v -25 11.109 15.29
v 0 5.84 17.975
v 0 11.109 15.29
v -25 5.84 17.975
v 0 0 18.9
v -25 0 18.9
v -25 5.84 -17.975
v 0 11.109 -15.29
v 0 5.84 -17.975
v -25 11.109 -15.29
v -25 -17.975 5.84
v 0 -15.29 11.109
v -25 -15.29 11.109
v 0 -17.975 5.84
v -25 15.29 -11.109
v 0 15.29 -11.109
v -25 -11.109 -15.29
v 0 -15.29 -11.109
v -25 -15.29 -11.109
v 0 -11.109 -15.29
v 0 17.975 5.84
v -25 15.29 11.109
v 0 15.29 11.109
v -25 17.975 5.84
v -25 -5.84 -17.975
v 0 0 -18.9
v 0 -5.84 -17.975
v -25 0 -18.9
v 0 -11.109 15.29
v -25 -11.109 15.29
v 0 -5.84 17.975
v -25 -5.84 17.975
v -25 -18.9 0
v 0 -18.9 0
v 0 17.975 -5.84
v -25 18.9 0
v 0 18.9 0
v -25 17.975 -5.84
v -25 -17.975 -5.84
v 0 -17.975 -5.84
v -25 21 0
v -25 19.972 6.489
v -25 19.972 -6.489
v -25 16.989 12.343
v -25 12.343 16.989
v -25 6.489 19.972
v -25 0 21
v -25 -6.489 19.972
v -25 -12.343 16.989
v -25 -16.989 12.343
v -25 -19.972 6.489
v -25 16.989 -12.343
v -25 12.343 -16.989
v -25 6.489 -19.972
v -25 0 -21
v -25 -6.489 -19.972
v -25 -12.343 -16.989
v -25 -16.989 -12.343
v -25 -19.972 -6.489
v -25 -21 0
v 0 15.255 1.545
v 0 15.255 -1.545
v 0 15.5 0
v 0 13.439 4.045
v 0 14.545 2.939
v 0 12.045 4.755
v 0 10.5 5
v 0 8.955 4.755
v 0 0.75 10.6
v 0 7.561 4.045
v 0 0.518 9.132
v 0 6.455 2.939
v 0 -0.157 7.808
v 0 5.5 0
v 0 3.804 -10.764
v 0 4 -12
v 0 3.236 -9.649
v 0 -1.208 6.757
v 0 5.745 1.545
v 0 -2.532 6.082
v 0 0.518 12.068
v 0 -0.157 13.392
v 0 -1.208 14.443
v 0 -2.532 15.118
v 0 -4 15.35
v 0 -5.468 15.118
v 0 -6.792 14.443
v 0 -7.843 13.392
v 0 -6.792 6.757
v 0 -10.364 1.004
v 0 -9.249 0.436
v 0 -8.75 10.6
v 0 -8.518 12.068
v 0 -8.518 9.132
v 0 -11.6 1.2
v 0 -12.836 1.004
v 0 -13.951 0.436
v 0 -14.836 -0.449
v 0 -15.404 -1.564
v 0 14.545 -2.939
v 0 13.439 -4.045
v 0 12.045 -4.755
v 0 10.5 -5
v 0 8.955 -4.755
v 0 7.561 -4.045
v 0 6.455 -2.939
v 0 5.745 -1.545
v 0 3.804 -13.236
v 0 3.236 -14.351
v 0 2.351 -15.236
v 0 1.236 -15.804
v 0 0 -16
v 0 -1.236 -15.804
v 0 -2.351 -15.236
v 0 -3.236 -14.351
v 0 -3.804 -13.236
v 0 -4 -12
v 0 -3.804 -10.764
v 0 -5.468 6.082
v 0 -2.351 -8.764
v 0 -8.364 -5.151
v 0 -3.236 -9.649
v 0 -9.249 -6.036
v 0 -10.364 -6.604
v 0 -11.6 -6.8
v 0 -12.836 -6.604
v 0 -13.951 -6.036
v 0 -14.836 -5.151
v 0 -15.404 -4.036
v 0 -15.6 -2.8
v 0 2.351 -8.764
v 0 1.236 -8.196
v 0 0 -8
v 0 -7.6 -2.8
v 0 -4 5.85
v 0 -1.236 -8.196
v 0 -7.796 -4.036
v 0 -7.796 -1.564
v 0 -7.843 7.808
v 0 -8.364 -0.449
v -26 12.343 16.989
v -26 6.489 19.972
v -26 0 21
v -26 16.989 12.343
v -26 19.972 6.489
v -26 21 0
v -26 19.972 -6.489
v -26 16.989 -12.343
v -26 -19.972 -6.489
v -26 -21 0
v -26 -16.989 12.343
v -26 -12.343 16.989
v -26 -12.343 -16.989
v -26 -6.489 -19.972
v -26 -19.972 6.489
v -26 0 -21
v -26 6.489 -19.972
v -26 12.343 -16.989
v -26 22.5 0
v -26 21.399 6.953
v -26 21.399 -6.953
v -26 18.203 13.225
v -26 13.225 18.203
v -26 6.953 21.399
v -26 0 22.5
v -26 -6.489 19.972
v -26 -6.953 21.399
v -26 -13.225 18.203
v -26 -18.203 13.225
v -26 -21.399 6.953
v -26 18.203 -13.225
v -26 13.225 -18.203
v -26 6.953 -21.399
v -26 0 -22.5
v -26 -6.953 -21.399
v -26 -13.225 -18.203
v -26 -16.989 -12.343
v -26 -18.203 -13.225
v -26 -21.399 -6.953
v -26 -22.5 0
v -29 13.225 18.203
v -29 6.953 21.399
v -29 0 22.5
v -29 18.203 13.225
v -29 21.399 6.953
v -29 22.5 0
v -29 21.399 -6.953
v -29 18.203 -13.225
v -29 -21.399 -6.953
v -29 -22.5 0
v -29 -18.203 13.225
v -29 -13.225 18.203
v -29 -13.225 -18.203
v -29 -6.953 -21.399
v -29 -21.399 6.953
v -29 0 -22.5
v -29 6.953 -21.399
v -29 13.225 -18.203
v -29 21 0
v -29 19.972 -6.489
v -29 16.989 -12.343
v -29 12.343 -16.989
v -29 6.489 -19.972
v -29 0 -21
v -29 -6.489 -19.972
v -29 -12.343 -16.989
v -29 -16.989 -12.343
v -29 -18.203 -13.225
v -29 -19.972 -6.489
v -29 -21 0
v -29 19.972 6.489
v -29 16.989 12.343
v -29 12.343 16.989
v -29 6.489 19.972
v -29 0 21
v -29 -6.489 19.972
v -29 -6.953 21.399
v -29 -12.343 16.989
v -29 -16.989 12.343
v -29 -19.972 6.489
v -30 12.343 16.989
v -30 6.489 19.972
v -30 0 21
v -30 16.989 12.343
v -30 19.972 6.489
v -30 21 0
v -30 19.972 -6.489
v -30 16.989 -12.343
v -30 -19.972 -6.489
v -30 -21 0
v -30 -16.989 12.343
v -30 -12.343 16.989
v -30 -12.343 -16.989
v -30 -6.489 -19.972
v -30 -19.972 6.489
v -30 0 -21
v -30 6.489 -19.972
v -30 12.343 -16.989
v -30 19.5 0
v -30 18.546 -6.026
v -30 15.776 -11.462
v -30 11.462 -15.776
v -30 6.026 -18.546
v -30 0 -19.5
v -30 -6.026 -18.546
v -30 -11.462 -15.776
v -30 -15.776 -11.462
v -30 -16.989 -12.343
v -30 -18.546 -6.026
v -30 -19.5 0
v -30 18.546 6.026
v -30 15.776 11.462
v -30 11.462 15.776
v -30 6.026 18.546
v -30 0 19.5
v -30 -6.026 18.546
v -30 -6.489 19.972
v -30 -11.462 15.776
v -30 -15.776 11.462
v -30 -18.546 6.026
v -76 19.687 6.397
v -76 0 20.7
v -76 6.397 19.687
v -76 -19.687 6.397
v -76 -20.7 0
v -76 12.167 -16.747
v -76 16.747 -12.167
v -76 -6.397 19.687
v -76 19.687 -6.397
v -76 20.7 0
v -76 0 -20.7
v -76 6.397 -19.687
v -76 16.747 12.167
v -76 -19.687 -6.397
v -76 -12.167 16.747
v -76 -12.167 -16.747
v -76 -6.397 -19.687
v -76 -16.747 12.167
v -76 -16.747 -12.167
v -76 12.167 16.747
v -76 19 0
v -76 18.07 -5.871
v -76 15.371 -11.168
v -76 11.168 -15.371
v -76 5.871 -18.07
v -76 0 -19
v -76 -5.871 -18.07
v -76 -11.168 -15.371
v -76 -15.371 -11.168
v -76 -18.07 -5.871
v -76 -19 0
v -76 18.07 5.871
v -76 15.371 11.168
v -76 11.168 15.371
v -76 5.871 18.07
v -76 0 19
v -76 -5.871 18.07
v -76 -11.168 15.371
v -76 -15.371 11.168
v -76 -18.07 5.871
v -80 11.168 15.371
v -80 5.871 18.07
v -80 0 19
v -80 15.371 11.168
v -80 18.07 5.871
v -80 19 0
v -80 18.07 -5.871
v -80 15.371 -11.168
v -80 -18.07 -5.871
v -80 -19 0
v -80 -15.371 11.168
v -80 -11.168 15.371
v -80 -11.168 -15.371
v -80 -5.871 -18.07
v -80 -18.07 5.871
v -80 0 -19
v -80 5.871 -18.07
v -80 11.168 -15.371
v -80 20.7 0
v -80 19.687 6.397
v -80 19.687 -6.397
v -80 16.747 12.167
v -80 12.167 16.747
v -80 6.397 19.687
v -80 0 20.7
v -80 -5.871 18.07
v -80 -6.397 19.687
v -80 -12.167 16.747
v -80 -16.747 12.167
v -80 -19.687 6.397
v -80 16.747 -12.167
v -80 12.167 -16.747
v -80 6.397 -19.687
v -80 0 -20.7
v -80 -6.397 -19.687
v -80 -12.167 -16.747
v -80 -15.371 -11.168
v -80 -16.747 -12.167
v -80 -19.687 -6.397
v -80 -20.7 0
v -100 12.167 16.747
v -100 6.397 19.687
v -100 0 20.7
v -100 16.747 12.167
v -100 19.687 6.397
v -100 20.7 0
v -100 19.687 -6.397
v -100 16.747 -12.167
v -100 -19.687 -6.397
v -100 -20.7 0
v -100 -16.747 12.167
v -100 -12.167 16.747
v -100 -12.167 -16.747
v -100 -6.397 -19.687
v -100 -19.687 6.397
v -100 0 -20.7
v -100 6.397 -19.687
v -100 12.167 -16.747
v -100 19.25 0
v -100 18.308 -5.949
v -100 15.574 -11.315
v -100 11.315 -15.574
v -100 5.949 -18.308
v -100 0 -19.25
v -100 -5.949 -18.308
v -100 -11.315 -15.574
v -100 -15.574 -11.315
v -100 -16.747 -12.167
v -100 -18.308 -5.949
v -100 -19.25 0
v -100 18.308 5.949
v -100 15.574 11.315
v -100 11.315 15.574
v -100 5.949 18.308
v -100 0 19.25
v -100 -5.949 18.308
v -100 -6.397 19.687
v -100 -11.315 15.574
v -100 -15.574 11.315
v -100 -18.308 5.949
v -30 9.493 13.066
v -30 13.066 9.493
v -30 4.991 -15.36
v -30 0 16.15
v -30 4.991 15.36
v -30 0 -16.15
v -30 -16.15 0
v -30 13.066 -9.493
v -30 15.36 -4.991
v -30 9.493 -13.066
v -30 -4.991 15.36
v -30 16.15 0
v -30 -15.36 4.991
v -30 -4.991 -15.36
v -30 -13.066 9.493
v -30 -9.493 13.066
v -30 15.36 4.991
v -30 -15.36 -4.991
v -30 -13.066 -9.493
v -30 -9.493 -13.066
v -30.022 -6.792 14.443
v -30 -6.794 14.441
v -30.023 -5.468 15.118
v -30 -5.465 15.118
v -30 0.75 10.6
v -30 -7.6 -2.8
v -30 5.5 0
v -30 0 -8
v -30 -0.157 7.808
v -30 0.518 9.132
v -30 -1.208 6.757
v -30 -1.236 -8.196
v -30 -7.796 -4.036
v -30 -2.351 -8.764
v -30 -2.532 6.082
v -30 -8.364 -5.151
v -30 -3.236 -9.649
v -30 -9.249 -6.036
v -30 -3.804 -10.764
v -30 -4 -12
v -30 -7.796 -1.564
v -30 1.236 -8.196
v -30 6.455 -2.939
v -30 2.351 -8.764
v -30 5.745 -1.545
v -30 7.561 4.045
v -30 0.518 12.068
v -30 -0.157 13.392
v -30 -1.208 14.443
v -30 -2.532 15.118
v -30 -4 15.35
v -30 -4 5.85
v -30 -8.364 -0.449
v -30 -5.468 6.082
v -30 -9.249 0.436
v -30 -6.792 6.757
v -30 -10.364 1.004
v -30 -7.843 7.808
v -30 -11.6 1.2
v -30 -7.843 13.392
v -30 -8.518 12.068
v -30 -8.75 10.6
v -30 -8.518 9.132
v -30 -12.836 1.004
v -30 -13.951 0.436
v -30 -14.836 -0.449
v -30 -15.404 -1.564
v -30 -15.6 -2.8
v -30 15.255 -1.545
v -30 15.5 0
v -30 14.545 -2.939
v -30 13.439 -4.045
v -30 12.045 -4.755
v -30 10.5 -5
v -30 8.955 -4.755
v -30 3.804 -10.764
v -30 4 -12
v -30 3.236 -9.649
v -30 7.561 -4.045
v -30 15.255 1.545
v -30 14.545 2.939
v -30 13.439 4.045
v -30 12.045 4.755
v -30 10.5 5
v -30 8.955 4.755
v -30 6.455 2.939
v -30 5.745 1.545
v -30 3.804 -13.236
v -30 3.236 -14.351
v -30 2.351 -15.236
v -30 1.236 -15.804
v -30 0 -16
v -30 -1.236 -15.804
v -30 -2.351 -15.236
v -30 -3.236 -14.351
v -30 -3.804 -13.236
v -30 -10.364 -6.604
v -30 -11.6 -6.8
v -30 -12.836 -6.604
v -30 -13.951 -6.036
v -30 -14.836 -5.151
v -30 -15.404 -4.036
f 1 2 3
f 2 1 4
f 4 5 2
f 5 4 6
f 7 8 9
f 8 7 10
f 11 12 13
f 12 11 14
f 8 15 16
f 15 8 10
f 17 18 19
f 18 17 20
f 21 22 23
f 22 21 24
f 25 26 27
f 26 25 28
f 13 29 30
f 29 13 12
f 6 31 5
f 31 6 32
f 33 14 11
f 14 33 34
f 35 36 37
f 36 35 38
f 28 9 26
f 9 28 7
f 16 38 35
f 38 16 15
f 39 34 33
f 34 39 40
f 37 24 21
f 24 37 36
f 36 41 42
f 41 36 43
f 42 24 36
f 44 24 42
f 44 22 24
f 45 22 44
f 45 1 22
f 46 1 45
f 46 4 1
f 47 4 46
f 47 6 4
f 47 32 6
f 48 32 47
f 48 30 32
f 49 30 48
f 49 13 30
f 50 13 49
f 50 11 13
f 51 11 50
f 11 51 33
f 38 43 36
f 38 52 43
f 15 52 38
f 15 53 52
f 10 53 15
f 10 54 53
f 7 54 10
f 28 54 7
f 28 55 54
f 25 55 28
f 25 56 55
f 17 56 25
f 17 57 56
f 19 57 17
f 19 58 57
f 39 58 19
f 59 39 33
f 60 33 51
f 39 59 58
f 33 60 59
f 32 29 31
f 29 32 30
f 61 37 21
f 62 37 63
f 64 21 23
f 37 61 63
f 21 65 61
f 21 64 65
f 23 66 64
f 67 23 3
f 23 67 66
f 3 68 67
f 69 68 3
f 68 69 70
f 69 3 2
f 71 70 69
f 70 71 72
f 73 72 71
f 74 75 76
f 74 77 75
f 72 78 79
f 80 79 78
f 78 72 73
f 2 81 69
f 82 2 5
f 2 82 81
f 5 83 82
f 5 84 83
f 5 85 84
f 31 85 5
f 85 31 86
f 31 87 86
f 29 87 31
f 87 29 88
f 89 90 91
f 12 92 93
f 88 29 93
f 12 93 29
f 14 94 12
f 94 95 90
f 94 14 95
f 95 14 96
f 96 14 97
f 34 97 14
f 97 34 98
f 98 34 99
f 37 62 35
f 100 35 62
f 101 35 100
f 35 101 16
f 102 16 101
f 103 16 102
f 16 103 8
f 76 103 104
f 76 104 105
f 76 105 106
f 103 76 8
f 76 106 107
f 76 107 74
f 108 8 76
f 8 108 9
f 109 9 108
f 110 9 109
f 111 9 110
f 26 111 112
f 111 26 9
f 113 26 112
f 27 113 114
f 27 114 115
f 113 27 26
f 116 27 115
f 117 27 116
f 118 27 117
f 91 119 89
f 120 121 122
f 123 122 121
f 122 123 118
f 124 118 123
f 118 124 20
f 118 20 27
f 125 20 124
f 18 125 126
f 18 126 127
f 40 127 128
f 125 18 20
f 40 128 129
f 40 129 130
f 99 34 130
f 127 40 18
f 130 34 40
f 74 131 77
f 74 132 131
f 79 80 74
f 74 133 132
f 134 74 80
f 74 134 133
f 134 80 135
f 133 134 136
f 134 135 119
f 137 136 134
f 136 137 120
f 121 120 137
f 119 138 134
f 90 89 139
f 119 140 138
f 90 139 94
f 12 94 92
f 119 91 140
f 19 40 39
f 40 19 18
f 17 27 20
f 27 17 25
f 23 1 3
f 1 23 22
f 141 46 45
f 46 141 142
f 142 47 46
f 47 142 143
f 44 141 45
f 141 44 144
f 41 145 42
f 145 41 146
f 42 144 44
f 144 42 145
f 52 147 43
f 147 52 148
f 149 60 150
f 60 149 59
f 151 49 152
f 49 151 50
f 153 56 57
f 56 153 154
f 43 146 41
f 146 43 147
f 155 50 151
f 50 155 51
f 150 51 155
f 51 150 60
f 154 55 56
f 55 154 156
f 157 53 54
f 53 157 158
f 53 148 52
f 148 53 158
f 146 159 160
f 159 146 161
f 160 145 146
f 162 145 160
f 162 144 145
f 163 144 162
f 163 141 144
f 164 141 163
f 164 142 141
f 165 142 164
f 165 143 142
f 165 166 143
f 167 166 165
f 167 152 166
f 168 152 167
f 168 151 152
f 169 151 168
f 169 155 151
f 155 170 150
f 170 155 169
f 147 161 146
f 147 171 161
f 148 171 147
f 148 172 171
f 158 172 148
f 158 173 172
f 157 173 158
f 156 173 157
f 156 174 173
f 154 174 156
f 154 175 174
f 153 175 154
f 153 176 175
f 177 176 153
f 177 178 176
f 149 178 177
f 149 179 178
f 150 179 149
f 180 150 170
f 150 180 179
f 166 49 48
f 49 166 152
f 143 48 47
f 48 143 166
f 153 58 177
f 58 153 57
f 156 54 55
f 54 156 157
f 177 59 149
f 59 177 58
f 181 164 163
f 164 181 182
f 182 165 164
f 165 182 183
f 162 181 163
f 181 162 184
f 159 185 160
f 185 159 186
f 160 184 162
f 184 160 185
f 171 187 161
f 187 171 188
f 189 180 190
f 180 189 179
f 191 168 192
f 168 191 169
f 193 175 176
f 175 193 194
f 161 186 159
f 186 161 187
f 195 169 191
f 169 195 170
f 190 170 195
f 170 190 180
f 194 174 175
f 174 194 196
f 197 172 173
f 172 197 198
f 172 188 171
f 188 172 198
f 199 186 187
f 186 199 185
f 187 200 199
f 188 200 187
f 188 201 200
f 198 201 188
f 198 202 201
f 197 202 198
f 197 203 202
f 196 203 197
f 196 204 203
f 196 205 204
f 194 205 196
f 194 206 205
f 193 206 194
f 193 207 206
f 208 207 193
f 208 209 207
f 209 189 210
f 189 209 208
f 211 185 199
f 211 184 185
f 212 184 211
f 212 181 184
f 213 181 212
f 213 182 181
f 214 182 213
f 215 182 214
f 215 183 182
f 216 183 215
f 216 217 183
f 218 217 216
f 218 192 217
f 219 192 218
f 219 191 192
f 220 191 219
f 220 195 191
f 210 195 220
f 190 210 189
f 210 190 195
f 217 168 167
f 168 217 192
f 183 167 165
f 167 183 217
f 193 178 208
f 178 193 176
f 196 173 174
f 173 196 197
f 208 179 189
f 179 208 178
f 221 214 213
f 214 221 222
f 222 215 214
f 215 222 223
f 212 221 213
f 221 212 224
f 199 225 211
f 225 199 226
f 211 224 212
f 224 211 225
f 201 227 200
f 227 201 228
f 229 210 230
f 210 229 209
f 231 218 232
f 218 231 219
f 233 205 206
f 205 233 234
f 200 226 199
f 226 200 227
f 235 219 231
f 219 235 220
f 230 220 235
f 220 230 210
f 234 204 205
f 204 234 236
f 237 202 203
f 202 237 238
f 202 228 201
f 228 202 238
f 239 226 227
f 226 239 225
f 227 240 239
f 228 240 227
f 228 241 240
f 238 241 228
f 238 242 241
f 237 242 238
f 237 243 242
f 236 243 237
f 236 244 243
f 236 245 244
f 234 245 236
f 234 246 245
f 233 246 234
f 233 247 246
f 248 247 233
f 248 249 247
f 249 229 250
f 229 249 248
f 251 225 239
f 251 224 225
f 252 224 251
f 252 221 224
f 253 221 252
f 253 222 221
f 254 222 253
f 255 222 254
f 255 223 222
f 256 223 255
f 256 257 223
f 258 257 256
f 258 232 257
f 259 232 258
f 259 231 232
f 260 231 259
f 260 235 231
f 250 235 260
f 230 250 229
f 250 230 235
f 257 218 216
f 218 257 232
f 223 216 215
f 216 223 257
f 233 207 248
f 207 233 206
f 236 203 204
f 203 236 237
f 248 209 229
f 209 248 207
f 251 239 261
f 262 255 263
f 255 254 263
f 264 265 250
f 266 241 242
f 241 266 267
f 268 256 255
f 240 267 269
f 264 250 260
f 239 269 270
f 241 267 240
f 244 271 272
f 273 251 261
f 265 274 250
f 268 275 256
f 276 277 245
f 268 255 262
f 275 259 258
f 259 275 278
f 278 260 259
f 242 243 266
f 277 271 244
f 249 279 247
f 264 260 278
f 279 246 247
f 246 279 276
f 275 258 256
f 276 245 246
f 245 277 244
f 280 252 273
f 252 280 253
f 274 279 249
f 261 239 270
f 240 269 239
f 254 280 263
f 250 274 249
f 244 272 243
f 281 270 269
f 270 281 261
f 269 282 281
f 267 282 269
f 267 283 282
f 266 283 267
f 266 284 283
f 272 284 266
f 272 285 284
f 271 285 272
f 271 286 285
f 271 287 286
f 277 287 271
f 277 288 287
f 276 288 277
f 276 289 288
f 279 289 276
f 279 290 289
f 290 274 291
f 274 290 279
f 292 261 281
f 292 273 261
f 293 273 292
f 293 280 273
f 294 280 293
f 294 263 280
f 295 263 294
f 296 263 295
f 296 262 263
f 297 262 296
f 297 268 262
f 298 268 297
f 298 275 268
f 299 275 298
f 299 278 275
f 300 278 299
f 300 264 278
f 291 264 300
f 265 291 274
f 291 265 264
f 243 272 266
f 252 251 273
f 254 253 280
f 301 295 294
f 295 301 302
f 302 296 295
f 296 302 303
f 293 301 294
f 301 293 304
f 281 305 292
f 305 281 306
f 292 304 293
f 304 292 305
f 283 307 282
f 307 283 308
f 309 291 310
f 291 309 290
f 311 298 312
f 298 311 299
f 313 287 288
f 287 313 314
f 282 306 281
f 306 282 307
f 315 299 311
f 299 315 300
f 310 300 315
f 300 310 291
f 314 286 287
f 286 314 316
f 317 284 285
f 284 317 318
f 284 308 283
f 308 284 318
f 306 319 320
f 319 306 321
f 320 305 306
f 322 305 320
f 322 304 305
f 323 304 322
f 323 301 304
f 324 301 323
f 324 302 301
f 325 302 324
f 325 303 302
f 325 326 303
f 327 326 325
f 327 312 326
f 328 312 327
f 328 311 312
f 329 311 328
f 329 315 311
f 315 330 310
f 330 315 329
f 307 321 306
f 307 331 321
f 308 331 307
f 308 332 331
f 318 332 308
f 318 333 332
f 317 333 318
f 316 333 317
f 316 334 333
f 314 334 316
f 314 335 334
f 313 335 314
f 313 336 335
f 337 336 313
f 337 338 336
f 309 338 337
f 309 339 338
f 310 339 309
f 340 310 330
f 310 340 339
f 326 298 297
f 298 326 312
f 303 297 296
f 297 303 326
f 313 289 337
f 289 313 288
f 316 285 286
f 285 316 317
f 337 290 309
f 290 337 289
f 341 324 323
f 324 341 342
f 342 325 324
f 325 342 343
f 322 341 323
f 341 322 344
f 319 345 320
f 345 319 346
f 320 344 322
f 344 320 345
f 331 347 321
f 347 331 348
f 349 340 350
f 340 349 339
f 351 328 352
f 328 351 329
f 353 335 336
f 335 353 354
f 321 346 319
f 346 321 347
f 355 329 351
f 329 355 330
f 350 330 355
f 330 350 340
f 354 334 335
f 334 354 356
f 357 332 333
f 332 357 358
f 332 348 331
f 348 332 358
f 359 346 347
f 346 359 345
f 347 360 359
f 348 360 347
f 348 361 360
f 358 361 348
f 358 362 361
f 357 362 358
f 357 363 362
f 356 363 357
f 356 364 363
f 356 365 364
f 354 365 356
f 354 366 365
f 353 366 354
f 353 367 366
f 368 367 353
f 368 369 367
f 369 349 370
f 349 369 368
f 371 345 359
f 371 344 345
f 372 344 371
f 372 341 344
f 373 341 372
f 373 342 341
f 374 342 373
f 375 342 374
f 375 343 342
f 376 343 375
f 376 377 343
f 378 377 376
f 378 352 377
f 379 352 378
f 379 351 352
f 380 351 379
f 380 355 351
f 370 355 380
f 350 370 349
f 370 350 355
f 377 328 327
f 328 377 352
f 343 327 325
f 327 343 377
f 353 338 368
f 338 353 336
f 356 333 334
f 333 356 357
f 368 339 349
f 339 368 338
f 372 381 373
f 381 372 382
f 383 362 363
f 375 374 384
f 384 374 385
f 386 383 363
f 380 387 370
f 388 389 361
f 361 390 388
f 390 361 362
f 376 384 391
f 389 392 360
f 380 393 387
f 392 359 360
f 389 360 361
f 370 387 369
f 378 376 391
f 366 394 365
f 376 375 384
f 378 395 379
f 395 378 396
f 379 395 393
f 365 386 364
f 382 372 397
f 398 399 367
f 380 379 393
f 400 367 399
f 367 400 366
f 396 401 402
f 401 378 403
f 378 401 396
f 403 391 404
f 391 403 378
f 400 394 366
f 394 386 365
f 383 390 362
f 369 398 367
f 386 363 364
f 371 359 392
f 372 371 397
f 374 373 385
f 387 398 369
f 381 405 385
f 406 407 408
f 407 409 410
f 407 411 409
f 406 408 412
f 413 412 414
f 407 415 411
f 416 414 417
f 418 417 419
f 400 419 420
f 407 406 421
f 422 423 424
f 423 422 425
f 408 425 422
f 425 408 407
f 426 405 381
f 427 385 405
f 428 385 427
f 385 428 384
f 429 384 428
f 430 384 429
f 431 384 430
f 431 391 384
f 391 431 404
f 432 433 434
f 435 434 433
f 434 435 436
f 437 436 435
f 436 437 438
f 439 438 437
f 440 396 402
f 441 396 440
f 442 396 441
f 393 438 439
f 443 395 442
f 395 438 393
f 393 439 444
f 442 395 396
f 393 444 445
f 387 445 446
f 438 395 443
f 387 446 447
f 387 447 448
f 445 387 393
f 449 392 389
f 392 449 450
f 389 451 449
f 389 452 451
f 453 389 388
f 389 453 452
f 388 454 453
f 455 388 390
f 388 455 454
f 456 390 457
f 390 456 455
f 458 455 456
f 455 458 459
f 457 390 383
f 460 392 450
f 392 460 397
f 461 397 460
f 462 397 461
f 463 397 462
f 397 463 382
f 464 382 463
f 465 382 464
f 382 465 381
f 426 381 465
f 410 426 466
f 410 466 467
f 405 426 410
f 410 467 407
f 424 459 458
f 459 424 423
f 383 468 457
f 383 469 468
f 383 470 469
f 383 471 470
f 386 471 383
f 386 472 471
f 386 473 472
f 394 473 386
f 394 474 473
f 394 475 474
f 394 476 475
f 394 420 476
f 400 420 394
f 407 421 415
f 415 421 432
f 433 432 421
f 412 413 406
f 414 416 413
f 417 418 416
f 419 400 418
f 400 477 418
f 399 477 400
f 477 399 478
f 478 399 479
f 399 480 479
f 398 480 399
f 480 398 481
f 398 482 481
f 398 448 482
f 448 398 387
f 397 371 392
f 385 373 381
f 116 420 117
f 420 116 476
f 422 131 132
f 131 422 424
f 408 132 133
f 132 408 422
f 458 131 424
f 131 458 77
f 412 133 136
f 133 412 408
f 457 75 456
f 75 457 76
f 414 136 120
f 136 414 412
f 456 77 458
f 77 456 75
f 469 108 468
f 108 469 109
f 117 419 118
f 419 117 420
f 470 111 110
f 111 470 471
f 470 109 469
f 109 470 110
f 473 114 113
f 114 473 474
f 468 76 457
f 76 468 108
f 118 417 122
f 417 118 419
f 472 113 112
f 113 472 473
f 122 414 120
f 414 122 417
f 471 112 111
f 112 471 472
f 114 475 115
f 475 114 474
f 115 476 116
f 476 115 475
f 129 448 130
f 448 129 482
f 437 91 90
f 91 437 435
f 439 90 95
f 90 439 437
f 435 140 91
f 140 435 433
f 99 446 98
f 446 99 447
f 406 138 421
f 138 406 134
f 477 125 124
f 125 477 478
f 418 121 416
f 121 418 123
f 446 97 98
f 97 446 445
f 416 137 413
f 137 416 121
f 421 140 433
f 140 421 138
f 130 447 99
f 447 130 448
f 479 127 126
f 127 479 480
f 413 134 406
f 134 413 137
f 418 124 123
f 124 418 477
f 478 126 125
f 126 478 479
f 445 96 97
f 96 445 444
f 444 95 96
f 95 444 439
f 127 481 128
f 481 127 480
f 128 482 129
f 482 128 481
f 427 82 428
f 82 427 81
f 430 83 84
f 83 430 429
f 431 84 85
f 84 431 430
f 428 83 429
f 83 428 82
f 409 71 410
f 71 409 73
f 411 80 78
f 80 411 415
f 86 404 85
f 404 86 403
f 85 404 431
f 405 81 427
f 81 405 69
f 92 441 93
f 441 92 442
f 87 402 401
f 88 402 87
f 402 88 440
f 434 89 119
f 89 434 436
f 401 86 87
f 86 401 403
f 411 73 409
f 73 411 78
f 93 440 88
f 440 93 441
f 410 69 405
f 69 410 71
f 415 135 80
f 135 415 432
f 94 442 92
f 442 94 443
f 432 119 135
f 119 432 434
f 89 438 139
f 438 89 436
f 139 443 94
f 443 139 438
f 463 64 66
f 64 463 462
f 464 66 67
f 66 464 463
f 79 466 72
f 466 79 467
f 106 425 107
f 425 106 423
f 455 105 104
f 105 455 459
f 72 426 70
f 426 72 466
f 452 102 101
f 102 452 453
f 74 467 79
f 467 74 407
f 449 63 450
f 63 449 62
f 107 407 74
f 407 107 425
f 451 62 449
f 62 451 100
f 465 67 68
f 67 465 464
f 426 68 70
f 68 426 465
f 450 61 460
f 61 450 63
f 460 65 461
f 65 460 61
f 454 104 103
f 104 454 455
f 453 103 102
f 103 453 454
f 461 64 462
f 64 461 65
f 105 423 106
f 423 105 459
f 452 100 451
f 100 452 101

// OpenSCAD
// openNSP_project, common stock version 1.0
// Zexuan Qiao, 2024
// under GPL license ver3

mainStockLOA = 100; //.1

ferruleWood = 25; //.1
ferruleWoodDiameter = 37.8; //.1

decoration1 = 1; //.1
decoration2 = 3; //.1
decoration3 = 1; //.1
decoration1Diameter = 42; //.1
decoration2Diameter = 45; //.1
decoration3Diameter = 42; //.1

main = 46; //.1
mainDiameter1 = 39; //.1
mainDiameter2 = 41.4; //.1

groove = 4; //.1
grooveDiameter = 38; //.1

bagEnd = 20; //.1

inside = 70; //.1
insideDiameter1 = 32.3; //.1
insideDiameter2 = 38.5; //.1

smallGBore = 8; //.1
smallG_X = -12; //.1
smallG_Y = 0; //.1
smallDBore = 8; //.1
smallD_X = -2.8; //.1
smallD_Y = 11.6; //.1
bigGBore = 9.5; //.1
bigG_X = 10.6; //.1
bigG_Y = 4; //.1
bigDBore = 10; //.1
bigD_X = 0; //.1
bigD_Y = -10.5; //.1


/* [Utilities] */
// Segments, the higher the value, the smoother the surface would be.
$fn = 20;

rotate([0,-90,0]) difference(){
union(){
cylinder(h = ferruleWood, d = ferruleWoodDiameter);
translate([0,0,ferruleWood]) cylinder(h = decoration1, d = decoration1Diameter);
translate([0,0,ferruleWood+decoration1]) cylinder(h = decoration2, d = decoration2Diameter);
translate([0,0,ferruleWood+decoration1+decoration2])cylinder(h = decoration3, d = decoration3Diameter);
translate([0,0,ferruleWood+decoration1+decoration2+decoration3]) cylinder(h = main, d1 = mainDiameter1, d2 = mainDiameter2);
translate([0,0,ferruleWood+decoration1+decoration2+decoration3+main]) cylinder(h = groove, d = grooveDiameter);
translate([0,0,ferruleWood+decoration1+decoration2+decoration3+main]) cylinder(h = groove, d = grooveDiameter);
translate([0,0,ferruleWood+decoration1+decoration2+decoration3+main+groove]) cylinder(h = bagEnd, d = mainDiameter2);
}
translate([0,0, mainStockLOA - inside]) cylinder(h = inside, d1 = insideDiameter1, d2 = insideDiameter2);
translate([smallG_X,-smallG_Y, 0]) cylinder(h = mainStockLOA, d = smallGBore);
translate([smallD_X, -smallD_Y,0]) cylinder(h = mainStockLOA, d = smallDBore);
translate([bigG_X, -bigG_Y,0]) cylinder(h = mainStockLOA, d = bigGBore);
translate([bigD_X, -bigD_Y, 0]) cylinder(h = mainStockLOA, d = bigDBore);
}
